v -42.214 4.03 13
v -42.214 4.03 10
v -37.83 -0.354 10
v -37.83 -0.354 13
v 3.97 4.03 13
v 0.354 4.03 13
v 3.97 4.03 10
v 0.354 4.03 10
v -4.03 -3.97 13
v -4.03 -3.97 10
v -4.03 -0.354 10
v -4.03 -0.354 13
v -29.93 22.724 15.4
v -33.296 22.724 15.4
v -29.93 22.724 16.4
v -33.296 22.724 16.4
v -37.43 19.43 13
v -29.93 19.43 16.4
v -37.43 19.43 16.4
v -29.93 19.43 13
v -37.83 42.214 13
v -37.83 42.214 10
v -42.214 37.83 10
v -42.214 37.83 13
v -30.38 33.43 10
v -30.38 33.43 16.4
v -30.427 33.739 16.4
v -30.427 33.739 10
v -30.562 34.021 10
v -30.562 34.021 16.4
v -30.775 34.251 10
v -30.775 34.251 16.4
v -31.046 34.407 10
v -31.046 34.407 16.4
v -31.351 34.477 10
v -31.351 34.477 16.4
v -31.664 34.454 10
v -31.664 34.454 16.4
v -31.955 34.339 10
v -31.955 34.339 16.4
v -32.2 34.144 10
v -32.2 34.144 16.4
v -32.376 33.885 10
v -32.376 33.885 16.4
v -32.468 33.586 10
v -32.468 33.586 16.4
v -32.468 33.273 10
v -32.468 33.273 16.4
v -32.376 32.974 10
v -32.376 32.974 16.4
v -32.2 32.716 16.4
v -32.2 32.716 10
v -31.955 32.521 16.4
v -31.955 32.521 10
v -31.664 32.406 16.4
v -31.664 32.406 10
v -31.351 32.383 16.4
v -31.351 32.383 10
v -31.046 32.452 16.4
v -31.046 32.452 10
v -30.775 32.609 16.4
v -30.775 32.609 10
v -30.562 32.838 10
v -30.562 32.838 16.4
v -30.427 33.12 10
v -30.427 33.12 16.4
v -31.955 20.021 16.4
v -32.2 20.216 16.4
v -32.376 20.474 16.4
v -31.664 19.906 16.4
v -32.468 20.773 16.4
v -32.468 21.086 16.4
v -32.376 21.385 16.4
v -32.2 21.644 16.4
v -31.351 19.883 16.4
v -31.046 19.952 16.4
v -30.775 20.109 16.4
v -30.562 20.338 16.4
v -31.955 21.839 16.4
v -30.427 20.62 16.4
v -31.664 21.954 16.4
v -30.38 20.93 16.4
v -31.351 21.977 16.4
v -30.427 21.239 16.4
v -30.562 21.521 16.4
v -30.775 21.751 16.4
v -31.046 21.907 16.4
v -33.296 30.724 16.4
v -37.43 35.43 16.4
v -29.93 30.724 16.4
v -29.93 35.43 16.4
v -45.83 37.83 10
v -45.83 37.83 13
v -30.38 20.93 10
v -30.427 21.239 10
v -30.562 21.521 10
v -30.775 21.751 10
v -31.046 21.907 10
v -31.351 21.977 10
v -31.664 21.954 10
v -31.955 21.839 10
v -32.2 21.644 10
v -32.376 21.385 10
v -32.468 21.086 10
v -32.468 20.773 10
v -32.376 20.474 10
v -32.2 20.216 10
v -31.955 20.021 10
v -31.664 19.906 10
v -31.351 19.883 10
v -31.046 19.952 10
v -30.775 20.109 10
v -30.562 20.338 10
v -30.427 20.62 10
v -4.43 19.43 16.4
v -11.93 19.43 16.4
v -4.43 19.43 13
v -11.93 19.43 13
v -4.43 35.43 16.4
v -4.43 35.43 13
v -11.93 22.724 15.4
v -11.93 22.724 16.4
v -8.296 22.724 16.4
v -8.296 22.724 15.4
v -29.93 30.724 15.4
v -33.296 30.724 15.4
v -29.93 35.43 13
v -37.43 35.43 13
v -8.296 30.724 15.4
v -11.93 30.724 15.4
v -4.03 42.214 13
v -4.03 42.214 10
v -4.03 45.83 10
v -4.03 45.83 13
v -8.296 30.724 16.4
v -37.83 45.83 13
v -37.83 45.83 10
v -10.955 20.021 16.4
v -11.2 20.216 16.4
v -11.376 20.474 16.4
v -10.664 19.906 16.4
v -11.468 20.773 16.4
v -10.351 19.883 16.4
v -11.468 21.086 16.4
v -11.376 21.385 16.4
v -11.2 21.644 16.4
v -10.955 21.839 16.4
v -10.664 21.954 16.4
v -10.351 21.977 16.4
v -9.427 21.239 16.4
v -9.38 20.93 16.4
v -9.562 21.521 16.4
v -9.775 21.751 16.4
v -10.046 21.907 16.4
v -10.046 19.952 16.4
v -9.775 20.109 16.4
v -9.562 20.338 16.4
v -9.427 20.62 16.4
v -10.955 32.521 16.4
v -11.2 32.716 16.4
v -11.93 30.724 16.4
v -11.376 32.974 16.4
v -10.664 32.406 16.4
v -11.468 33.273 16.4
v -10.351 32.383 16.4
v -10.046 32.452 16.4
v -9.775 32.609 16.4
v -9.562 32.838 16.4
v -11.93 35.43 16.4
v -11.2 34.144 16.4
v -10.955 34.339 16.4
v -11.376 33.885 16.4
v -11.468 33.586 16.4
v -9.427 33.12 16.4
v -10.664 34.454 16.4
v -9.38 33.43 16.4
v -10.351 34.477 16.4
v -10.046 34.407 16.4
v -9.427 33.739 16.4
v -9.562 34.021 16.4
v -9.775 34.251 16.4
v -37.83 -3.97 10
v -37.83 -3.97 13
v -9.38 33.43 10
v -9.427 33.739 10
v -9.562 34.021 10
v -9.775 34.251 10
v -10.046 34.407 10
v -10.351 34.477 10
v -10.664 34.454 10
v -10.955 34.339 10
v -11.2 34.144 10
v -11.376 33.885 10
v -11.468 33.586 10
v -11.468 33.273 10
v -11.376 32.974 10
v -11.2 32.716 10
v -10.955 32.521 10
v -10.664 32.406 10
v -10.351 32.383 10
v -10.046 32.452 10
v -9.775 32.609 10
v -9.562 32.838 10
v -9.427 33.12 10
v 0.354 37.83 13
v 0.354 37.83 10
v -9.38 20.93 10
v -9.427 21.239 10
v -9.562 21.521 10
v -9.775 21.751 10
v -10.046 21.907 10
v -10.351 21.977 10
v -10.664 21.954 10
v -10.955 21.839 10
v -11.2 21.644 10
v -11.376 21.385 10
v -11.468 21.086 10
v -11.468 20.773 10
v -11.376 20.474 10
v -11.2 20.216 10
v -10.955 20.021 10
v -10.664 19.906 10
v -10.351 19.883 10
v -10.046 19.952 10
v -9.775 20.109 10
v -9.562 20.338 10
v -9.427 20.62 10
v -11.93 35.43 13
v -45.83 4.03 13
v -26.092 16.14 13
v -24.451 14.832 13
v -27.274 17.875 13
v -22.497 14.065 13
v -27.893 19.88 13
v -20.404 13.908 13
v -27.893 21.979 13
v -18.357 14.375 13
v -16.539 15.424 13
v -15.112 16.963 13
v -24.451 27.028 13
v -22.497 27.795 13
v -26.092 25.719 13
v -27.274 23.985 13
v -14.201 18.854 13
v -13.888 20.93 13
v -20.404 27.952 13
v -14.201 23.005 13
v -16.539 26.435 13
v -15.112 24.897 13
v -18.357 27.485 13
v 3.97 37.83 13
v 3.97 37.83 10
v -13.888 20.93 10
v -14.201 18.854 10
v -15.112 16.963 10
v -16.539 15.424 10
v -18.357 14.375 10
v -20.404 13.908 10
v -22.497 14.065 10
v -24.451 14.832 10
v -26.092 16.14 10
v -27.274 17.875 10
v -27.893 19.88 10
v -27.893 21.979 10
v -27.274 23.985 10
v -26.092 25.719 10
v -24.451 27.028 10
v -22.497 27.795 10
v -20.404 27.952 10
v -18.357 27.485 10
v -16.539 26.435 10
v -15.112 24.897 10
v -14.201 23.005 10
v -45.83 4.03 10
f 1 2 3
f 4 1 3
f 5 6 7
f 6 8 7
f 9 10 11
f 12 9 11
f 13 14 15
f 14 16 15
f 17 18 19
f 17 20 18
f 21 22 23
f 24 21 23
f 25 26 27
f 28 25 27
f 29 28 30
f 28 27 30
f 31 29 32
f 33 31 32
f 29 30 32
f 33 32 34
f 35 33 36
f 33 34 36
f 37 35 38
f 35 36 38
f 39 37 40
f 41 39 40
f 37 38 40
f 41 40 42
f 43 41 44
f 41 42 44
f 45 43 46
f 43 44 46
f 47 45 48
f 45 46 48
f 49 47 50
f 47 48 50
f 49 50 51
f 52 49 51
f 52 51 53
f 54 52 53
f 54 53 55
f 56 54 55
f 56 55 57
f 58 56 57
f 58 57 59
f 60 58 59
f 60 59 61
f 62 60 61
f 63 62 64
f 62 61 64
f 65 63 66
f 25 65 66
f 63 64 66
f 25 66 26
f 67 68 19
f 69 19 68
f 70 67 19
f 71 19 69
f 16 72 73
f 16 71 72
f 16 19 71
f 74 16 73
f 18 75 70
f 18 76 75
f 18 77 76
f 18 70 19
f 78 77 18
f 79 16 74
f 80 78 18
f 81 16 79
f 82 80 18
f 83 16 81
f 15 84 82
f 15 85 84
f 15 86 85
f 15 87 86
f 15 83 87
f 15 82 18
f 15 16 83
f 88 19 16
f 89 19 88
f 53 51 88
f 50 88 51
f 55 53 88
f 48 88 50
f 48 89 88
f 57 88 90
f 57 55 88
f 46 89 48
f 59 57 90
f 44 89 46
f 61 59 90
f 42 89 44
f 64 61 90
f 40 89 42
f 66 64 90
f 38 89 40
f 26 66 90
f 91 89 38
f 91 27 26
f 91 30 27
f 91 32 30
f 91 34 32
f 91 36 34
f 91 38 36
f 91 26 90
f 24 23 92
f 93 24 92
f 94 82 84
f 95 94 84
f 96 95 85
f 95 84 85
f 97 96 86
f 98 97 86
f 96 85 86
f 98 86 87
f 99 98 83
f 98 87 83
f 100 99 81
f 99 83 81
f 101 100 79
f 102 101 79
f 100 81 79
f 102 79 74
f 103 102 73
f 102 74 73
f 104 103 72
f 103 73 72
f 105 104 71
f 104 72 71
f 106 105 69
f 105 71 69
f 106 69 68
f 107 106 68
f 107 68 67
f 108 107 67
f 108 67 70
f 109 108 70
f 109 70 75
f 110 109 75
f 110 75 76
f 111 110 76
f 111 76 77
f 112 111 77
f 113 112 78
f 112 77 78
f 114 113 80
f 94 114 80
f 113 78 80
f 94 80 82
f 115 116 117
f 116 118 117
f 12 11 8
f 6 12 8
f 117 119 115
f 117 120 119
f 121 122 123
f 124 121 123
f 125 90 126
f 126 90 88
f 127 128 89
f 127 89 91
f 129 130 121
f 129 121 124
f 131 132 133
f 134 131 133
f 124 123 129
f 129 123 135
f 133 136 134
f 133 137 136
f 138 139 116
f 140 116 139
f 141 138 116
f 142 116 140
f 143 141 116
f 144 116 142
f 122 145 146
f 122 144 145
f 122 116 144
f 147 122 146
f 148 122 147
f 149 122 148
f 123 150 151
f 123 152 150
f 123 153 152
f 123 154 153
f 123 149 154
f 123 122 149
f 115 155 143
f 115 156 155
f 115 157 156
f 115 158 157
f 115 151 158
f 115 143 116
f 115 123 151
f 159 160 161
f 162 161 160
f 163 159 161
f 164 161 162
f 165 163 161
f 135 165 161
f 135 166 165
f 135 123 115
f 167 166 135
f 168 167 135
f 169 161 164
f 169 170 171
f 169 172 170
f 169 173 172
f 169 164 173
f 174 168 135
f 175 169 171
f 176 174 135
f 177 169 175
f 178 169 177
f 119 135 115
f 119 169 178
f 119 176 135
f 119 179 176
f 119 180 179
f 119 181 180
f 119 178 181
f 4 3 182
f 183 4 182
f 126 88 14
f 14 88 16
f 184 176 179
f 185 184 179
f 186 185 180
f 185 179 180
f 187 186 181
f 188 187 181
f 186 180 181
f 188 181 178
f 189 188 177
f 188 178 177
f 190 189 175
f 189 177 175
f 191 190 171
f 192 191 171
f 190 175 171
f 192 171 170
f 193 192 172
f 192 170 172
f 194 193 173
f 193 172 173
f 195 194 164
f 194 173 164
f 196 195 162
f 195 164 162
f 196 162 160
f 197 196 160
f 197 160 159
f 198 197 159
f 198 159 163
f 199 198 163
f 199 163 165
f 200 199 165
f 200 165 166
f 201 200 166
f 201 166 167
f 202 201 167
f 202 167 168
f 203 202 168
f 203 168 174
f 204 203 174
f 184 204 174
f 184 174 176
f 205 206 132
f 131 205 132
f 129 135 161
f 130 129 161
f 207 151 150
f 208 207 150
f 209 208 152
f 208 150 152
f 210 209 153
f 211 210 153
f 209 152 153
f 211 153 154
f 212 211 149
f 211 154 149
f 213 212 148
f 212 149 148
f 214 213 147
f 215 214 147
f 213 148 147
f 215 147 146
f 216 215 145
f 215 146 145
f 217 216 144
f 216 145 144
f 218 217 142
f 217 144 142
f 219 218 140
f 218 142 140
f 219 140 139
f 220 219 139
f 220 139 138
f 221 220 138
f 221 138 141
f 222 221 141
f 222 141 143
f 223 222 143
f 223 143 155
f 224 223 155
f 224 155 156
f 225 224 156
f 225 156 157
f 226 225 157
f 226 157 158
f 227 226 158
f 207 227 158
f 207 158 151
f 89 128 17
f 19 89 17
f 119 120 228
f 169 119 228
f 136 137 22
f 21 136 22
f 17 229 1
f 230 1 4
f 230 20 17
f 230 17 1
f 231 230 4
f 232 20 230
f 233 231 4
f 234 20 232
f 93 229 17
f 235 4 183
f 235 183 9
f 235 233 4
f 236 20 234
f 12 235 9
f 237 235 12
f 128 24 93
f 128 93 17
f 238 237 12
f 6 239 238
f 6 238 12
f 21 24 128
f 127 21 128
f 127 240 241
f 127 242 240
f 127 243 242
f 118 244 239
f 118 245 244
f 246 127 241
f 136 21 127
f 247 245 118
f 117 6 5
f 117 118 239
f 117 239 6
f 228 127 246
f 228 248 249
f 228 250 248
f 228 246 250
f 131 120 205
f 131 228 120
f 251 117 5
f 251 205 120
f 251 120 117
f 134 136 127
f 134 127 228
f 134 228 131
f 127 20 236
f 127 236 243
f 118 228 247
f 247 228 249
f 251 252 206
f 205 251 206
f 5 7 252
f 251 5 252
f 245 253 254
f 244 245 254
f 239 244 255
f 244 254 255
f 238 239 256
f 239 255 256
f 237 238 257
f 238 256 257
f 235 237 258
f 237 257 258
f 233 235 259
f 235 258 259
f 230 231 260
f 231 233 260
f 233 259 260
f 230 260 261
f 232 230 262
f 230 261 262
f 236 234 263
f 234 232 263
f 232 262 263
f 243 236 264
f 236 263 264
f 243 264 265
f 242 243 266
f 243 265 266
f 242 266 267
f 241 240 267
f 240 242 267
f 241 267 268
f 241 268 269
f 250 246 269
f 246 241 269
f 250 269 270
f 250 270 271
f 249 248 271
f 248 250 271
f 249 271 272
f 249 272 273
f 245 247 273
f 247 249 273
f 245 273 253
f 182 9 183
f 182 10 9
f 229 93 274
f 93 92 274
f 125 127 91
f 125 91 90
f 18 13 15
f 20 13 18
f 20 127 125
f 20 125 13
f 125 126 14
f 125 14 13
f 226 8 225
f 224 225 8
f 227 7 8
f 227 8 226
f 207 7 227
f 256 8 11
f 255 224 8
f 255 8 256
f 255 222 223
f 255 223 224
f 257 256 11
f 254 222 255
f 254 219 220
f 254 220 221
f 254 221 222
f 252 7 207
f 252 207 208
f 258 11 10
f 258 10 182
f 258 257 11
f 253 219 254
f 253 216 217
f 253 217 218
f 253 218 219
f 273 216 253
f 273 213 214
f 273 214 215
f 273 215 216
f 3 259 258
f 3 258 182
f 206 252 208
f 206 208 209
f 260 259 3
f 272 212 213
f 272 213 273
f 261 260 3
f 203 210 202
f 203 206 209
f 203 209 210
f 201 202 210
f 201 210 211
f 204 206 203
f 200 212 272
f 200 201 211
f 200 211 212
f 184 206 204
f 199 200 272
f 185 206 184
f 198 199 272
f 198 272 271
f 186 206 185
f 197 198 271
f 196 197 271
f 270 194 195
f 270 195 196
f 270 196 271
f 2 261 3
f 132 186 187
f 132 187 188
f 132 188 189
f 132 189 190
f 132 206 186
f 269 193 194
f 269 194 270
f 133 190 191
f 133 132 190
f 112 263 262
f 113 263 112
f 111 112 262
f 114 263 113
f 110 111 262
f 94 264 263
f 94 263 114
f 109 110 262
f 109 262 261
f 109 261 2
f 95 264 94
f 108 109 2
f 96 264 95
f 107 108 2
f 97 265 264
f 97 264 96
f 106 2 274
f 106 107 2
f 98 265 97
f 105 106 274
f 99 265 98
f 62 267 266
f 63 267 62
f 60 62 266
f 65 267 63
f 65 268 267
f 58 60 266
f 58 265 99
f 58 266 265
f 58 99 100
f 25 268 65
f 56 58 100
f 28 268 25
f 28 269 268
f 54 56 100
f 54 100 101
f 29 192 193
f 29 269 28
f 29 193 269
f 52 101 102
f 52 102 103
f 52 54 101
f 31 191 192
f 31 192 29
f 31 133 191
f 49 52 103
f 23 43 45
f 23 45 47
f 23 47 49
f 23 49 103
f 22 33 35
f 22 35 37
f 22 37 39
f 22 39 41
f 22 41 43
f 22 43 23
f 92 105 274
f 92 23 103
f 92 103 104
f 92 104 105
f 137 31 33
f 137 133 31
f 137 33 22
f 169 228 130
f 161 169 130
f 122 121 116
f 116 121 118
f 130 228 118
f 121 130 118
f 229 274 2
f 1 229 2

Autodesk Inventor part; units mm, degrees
ref_plane "YZ Plane" through (0, 0, 0) normal (1, 0, 0) x (0, 1, 0)
ref_plane "Work Plane1" through (0, 0, 10) normal (0, 0, 1) x (1, 0, 0)
sketch "Sketch1" plane through (0, 0, 10) normal (0, 0, 1) x (1, 0, 0)
  line L0 (-4.0299, -0.3538) -> (-2.2322, 1.4439) construction
  arc A0 (-1.4439, 2.2322) -> (-2.2322, 1.4439) centre (-0.9299, 0.9299) ccw construction
  line L1 (-1.4439, 2.2322) -> (0.3538, 4.0299) construction
  line L2 (-37.8299, 42.2137) -> (-37.8299, 45.8299) construction
  line L3 (-37.8299, 45.8299) -> (-4.0299, 45.8299) construction
  line L4 (-4.0299, 45.8299) -> (-4.0299, 42.2137) construction
  line L5 (-4.0299, 4.0299) -> (0.3538, 4.0299) projected
  circle A1 centre (-20.9299, 20.9299) radius 17.5 projected
  line L6 (-20.9299, 58.9723) -> (17.1124, 20.9299) construction
  line L7 (17.1124, 20.9299) -> (-20.9299, -17.1124) construction
  line L8 (-20.9299, -17.1124) -> (-58.9723, 20.9299) construction
  line L9 (-58.9723, 20.9299) -> (-20.9299, 58.9723) construction
  line L10 (-20.9299, 58.9723) -> (-20.9299, -17.1124) construction
  line L11 (17.1124, 20.9299) -> (-58.9723, 20.9299) construction
  line L12 (-20.9299, 58.9723) -> (32.8701, 58.9723) construction
  line L13 (-43.4299, 43.4299) -> (1.5701, 43.4299) construction
  line L14 (1.5701, 43.4299) -> (1.5701, -1.5701) construction
  line L15 (1.5701, -1.5701) -> (-43.4299, -1.5701) construction
  line L16 (-43.4299, -1.5701) -> (-43.4299, 43.4299) construction
  line L17 (-43.4299, 43.4299) -> (1.5701, -1.5701) construction
  line L18 (1.5701, 43.4299) -> (-43.4299, -1.5701) construction
  line L19 (-43.4299, 5.3876) -> (-43.4299, 36.4723)
  line L20 (-43.4299, 36.4723) -> (-36.4723, 43.4299)
  line L21 (-36.4723, 43.4299) -> (-5.3876, 43.4299)
  line L22 (-5.3876, 43.4299) -> (1.5701, 36.4723)
  line L23 (1.5701, 36.4723) -> (1.5701, 5.3876)
  line L24 (1.5701, 5.3876) -> (-5.3876, -1.5701)
  line L25 (-5.3876, -1.5701) -> (-36.4723, -1.5701)
  line L26 (-36.4723, -1.5701) -> (-43.4299, 5.3876)
  line L27 (-4.0299, 42.2137) -> (-37.8299, 42.2137) projected
  line L28 (-4.0299, -0.3538) -> (-4.0299, 4.0299) projected
  circle A2 centre (-20.9299, 20.9299) radius 7.0417
  point P0 (-37.8299, 4.0299)
  dimension "d18" = 53.8
  dimension "d19" = 45
  dimension "d20" = 53.8
  dimension "d21" = 45
  dimension "d22" = 45
extrude "Extrusion1" add sketch "Sketch1" along normal blind 3 contours L28 L24 L25 L26 L19 L20 L27 L22 L23 L5 | L5 L24 L28 | L27 L20 L21 L22 | A1
sketch "Sketch3" plane through (0, 0, 10) normal (0, 0, -1) x (-1, 0, 0)
  line L0 (37.8299, -0.4701) -> (37.8299, 4.0299) construction
  line L1 (4.0299, 4.0299) -> (4.0299, -0.4701) construction
  line L2 (37.8299, -0.4701) -> (37.8299, 1.1886) construction
  line L3 (4.0299, -3.9701) -> (4.0299, -0.3538) construction
  line L4 (45.8299, 4.0299) -> (42.2137, 4.0299) construction
  line L5 (-0.3538, 4.0299) -> (-3.9701, 4.0299) construction
  line L6 (-3.9701, 37.8299) -> (-0.3538, 37.8299) construction
  line L7 (4.0299, 42.2137) -> (4.0299, 45.8299) construction
  line L8 (37.8299, 45.8299) -> (37.8299, 42.2137) construction
  line L9 (42.2137, 37.8299) -> (45.8299, 37.8299) construction
  line L10 (37.8299, 37.7299) -> (45.8299, 37.7299)
  line L11 (45.8299, 37.7299) -> (45.8299, 4.1299)
  line L12 (45.8299, 4.1299) -> (37.8299, 4.1299)
  line L13 (37.8299, 4.1299) -> (37.8299, 37.7299)
  line L14 (37.7299, 4.0299) -> (4.1299, 4.0299)
  line L15 (4.1299, 4.0299) -> (4.1299, -3.9701)
  line L16 (4.1299, -3.9701) -> (37.7299, -3.9701)
  line L17 (37.7299, -3.9701) -> (37.7299, 4.0299)
  line L18 (4.0299, 4.1299) -> (-3.9701, 4.1299)
  line L19 (-3.9701, 4.1299) -> (-3.9701, 37.7299)
  line L20 (-3.9701, 37.7299) -> (4.0299, 37.7299)
  line L21 (4.0299, 37.7299) -> (4.0299, 4.1299)
  line L22 (4.1299, 37.8299) -> (37.7299, 37.8299)
  line L23 (37.7299, 37.8299) -> (37.7299, 45.8299)
  line L24 (37.7299, 45.8299) -> (4.1299, 45.8299)
  line L25 (4.1299, 45.8299) -> (4.1299, 37.8299)
  point P0 (0, 0)
  dimension "d23" = 0.1
  dimension "d24" = 0.1
  dimension "d25" = 0.1
  dimension "d26" = 0.1
  dimension "d27" = 0.1
extrude "Extrusion3" add sketch "Sketch3" against normal up to surface (3 mm away)
sketch "Sketch4" plane through (0, 0, 13) normal (0, 0, 1) x (1, 0, 0)
  line L0 (-33.4299, 35.4299) -> (-33.4299, 11.4299) construction
  line L1 (-33.4299, 11.4299) -> (-8.4299, 11.4299) construction
  line L2 (-8.4299, 11.4299) -> (-8.4299, 35.4299) construction
  line L3 (-8.4299, 35.4299) -> (-33.4299, 35.4299) construction
  circle A0 centre (-10.4299, 33.4299) radius 1.05 construction
  circle A1 centre (-10.4299, 20.9299) radius 1.05 construction
  circle A2 centre (-31.4299, 20.9299) radius 1.05 construction
  circle A3 centre (-31.4299, 33.4299) radius 1.05 construction
  line L4 (-15.4299, 29.8299) -> (-12.4299, 29.8299) construction
  line L5 (-15.4299, 31.8299) -> (-15.4299, 29.8299) construction
  line L6 (-12.4299, 31.8299) -> (-15.4299, 31.8299) construction
  line L7 (-12.4299, 29.8299) -> (-12.4299, 31.8299) construction
  line L8 (-8.4299, 35.4299) -> (-11.9299, 35.4299)
  line L9 (-11.9299, 35.4299) -> (-11.9299, 19.4299)
  line L10 (-11.9299, 19.4299) -> (-8.4299, 19.4299)
  line L11 (-8.4299, 19.4299) -> (-8.4299, 35.4299)
  line L12 (-33.4299, 35.4299) -> (-29.9299, 35.4299)
  line L13 (-29.9299, 35.4299) -> (-29.9299, 19.4299)
  line L14 (-29.9299, 19.4299) -> (-33.4299, 19.4299)
  line L15 (-33.4299, 19.4299) -> (-33.4299, 35.4299)
  line L16 (-33.4299, 35.4299) -> (-37.4299, 35.4299)
  line L17 (-37.4299, 35.4299) -> (-37.4299, 19.4299)
  line L18 (-37.4299, 19.4299) -> (-33.4299, 19.4299)
  line L19 (-33.4299, 19.4299) -> (-33.4299, 35.4299)
  line L20 (-8.4299, 35.4299) -> (-4.4299, 35.4299)
  line L21 (-4.4299, 35.4299) -> (-4.4299, 19.4299)
  line L22 (-4.4299, 19.4299) -> (-8.4299, 19.4299)
  line L23 (-8.4299, 19.4299) -> (-8.4299, 35.4299)
  point P0 (0, 0)
  dimension "d30" = 3.5
  dimension "d31" = 16
  dimension "d32" = 3.5
  dimension "d37" = 4
  dimension "d38" = 4
ref_plane "Work Plane3" through (-33.4299, 11.4299, 16.4) normal (0, 0, -1) x (0, 1, 0)
extrude "Extrusion4" add sketch "Sketch4" along normal up to surface (3.4 mm away)
sketch "Sketch5" plane through (-11.9299, 35.4299, 16.4) normal (0, 0, 1) x (1, 0, 0)
  circle A0 centre (1.5, -14.5) radius 1.05 projected
  circle A1 centre (1.5, -2) radius 1.05 projected
  circle A2 centre (-19.5, -2) radius 1.05 projected
  circle A3 centre (-19.5, -14.5) radius 1.05 projected
  point P0 (11.9299, -35.4299)
extrude "Extrusion5" cut sketch "Sketch5" against normal through all
sketch "Sketch7" plane through (-37.4299, 35.4299, 13) normal (0, 1, 0) x (1, 0, 0)
  line L0 (4.95, -3.4) -> (4.95, 3) projected
  line L1 (7.5, -3.4) -> (0, -3.4) projected
  line L2 (7.5, 0) -> (7.5, -3.4) projected
  line L3 (0, 0) -> (7.5, 0) projected
  line L4 (0, 0) -> (0, -3.4) projected
  line L5 (33, -3.4) -> (25.5, -3.4) projected
  line L6 (33, 0) -> (33, -3.4) projected
  line L7 (25.5, 0) -> (33, 0) projected
  line L8 (25.5, 0) -> (25.5, -3.4) projected
  line L9 (0, -3.4) -> (7.5, -3.4) projected
  line L10 (0, -3.4) -> (3, -3.4)
  line L11 (3, -3.4) -> (3, -13.4)
  line L12 (3, -13.4) -> (0, -13.4)
  line L13 (0, -13.4) -> (0, -3.4)
  line L14 (33, -3.4) -> (30, -3.4)
  line L15 (30, -3.4) -> (30, -13.4)
  line L16 (30, -13.4) -> (33, -13.4)
  line L17 (33, -13.4) -> (33, -3.4)
  line L18 (0, -13.4) -> (7, -13.4)
  line L19 (7, -13.4) -> (7, -15.4)
  line L20 (7, -15.4) -> (0, -15.4)
  line L21 (0, -15.4) -> (0, -13.4)
  line L22 (33, -13.4) -> (26, -13.4)
  line L23 (26, -13.4) -> (26, -15.4)
  line L24 (26, -15.4) -> (33, -15.4)
  line L25 (33, -15.4) -> (33, -13.4)
  line L26 (3, -12) -> (5, -12)
  line L27 (5, -12) -> (5, -10)
  line L28 (5, -10) -> (3, -10)
  line L29 (3, -10) -> (3, -12)
  line L30 (30, -12) -> (28, -12)
  line L31 (28, -12) -> (28, -10)
  line L32 (28, -10) -> (30, -10)
  line L33 (30, -10) -> (30, -12)
  line L34 (5, -10) -> (3, -8)
  line L35 (5, -10) -> (7.8284, -10) construction
  line L36 (28, -10) -> (30, -8)
  line L37 (0, -15.4) -> (-2.7154, 0)
  line L38 (-4.7423, 0) -> (-0.3, 0) projected
  line L39 (0, -15.4) -> (15.6376, -15.4) construction
  line L40 (-2.7154, 0) -> (0, 0)
  line L41 (0, -15.4) -> (0, 0)
  line L42 (33, -15.4) -> (35.7154, 0)
  line L43 (33, -15.4) -> (48.6376, -15.4) construction
  line L44 (35.7154, 0) -> (33, 0)
  line L45 (37.7423, 0) -> (33.3, 0) projected
  line L46 (33, -15.4) -> (33, 0)
  point P0 (37.4299, 13)
  dimension "d39" = 3
  dimension "d40" = 10
  dimension "d41" = 3
  dimension "d42" = 7
  dimension "d43" = 2
  dimension "d44" = 7
  dimension "d47" = 27
  dimension "d48" = 1.4
  dimension "d49" = 2
  dimension "d50" = 2
  dimension "d51" = 2
  dimension "d52" = 135
  dimension "d53" = 100
  dimension "d54" = 80
extrude "Extrusion6" [suppressed]
sketch "Sketch8" plane through (-29.9299, 35.4299, 16.4) normal (0, 1, 0) x (1, 0, 0)
  line L0 (0, 0) -> (-7.5, 0) projected
  line L1 (0, 3.4) -> (0, 0) projected
  line L2 (-7.5, 3.4) -> (0, 3.4) projected
  line L3 (18, 3.4) -> (25.5, 3.4) projected
  line L4 (18, 3.4) -> (18, 0) projected
  line L5 (25.5, 0) -> (18, 0) projected
  line L6 (25.5, 3.4) -> (25.5, 0) projected
  line L7 (-7.5, 3.4) -> (-7.5, 0) projected
  point P0 (29.9299, 16.4)
extrude "Extrusion7" [suppressed]
sketch "Sketch9" plane through (-37.7299, 45.8299, 13) normal (0, 0, -1) x (-1, 0, 0)
  line L0 (0, -3.6577) -> (2.4154, -6.0731) projected
  line L1 (2.4154, -6.0731) -> (2.4154, 0) projected
  line L2 (2.4154, 0) -> (0, 0) projected
  line L3 (0, -3.6577) -> (0, 0) projected
  line L4 (-33.6, 0) -> (-33.6, -3.6577) projected
  line L5 (-33.6, 0) -> (-36.0154, 0) projected
  line L6 (-36.0154, -6.0731) -> (-36.0154, 0) projected
  line L7 (-36.0154, -6.0731) -> (-33.6, -3.6577) projected
  point P0 (-37.7299, -45.8299)
extrude "Extrusion8" [suppressed]
sketch "Sketch10" plane through (-29.9299, 19.4299, 16.4) normal (0, 0, 1) x (1, 0, 0)
  line L0 (0, 16) -> (0, 0) projected
  line L1 (18, 0) -> (18, 16) projected
  line L2 (-3.3664, 3.2942) -> (21.6336, 3.2942)
  line L3 (21.6336, 3.2942) -> (21.6336, 11.2942)
  line L4 (21.6336, 11.2942) -> (-3.3664, 11.2942)
  line L5 (-3.3664, 11.2942) -> (-3.3664, 3.2942)
  line L6 (-3.3664, 3.2942) -> (21.6336, 11.2942) construction
  line L7 (21.6336, 3.2942) -> (-3.3664, 11.2942) construction
  point P0 (29.9299, -19.4299)
  point P1 (0, 26.4)
  point P2 (18, 26.4)
  point P3 (9.1336, 7.2942)
  dimension "d59" = 25
  dimension "d60" = 8
extrude "Extrusion9" cut sketch "Sketch10" against normal blind 1
sketch "Sketch11" plane through (-37.4299, 19.4299, 28.4) normal (0, 0, 1) x (1, 0, 0)
  line L0 (0, 0) -> (7, 0) projected
  line L1 (7, 0) -> (7, 26.4) projected
  line L2 (7, 26.4) -> (0, 26.4) projected
  line L3 (0, 26.4) -> (0, 0) projected
  line L4 (26, 0) -> (33, 0) projected
  line L5 (33, 0) -> (33, 26.4) projected
  line L6 (33, 26.4) -> (26, 26.4) projected
  line L7 (26, 0) -> (26, 26.4) projected
  circle A0 centre (16.5, 1.5) radius 7.0417 projected
  circle A1 centre (6, 1.5) radius 1.05 construction
  circle A2 centre (6, 14) radius 1.05 construction
  line L8 (27, 1.5) -> (6, 1.5) construction
  line L9 (27, 4.6642) -> (6, 4.6642)
  line L10 (6, -1.6642) -> (27, -1.6642)
  arc A3 (27, -1.6642) -> (27, 4.6642) centre (27, 1.5) ccw
  arc A4 (6, 4.6642) -> (6, -1.6642) centre (6, 1.5) ccw
  line L11 (27, 14) -> (6, 14) construction
  line L12 (27, 17.1642) -> (6, 17.1642)
  line L13 (6, 10.8358) -> (27, 10.8358)
  arc A5 (27, 10.8358) -> (27, 17.1642) centre (27, 14) ccw
  arc A6 (6, 17.1642) -> (6, 10.8358) centre (6, 14) ccw
  point P0 (37.4299, -19.4299)
  point P1 (16.5, 14)
extrude "Extrusion10" [suppressed]
sketch "Skizze12" plane through (0, 0, 10) normal (0, 0, -1) x (-1, 0, 0)
  circle A0 centre (31.4299, 33.4299) radius 1.05 construction
  circle A1 centre (10.4299, 20.9299) radius 1.05 construction
  circle A2 centre (10.4299, 33.4299) radius 1.05 construction
  circle A3 centre (31.4299, 20.9299) radius 1.05 construction
  line L0 (-0.3124, 4.1299) -> (4.1299, -0.3124) projected
  line L1 (4.1299, -0.3124) -> (4.1299, -3.9701) projected
  line L2 (4.1299, -3.9701) -> (37.7299, -3.9701) construction
  line L3 (37.7299, -3.9701) -> (37.7299, -0.3124) projected
  line L4 (37.7299, -0.3124) -> (42.1723, 4.1299) projected
  line L5 (45.8299, 4.1299) -> (42.1723, 4.1299) projected
  line L6 (45.8299, 37.7299) -> (45.8299, 4.1299) construction
  line L7 (42.1723, 37.7299) -> (45.8299, 37.7299) projected
  line L8 (42.1723, 37.7299) -> (37.7299, 42.1723) projected
  line L9 (37.7299, 42.1723) -> (37.7299, 45.8299) projected
  line L10 (37.7299, 45.8299) -> (4.1299, 45.8299) construction
  line L11 (4.1299, 45.8299) -> (4.1299, 42.1723) projected
  line L12 (4.1299, 42.1723) -> (-0.3124, 37.7299) projected
  line L13 (-3.9701, 37.7299) -> (-0.3124, 37.7299) projected
  line L14 (-3.9701, 4.1299) -> (-3.9701, 37.7299) construction
  line L15 (-0.3124, 4.1299) -> (-3.9701, 4.1299) projected
  circle A4 centre (20.9299, 20.9299) radius 7.0417 construction
  line L16 (37.8299, -4.0701) -> (4.0299, -4.0701) construction
  line L17 (4.0299, -4.0701) -> (4.0299, -0.3538)
  line L18 (4.0299, -0.3538) -> (-0.3538, 4.0299)
  line L19 (-0.3538, 4.0299) -> (-4.0701, 4.0299)
  line L20 (-4.0701, 4.0299) -> (-4.0701, 37.8299) construction
  line L21 (-4.0701, 37.8299) -> (-0.3538, 37.8299)
  line L22 (-0.3538, 37.8299) -> (4.0299, 42.2137)
  line L23 (4.0299, 42.2137) -> (4.0299, 45.9299)
  line L24 (4.0299, 45.9299) -> (37.8299, 45.9299) construction
  line L25 (37.8299, 45.9299) -> (37.8299, 42.2137)
  line L26 (37.8299, 42.2137) -> (42.2137, 37.8299)
  line L27 (42.2137, 37.8299) -> (45.9299, 37.8299)
  line L28 (45.9299, 37.8299) -> (45.9299, 4.0299) construction
  line L29 (45.9299, 4.0299) -> (42.2137, 4.0299)
  line L30 (42.2137, 4.0299) -> (37.8299, -0.3538)
  line L31 (37.8299, -0.3538) -> (37.8299, -4.0701)
  line L32 (-3.9701, 37.7299) -> (-3.9701, 37.8299)
  line L33 (37.7299, 45.8299) -> (4.1299, 45.8299) projected
  line L34 (4.1299, 45.8299) -> (4.0299, 45.8299)
  line L35 (37.7299, 45.8299) -> (37.8299, 45.8299)
  line L36 (45.8299, 37.7299) -> (45.8299, 37.8299)
  line L37 (45.8299, 4.1299) -> (45.8299, 4.0299)
  line L38 (37.7299, -3.9701) -> (37.8299, -3.9701)
  line L39 (4.1299, -3.9701) -> (4.0299, -3.9701)
  line L40 (-3.9701, 4.1299) -> (-3.9701, 4.0299)
  point P0 (0, 0)
  dimension "d18" = 53.8
  dimension "d19" = 45
  dimension "d20" = 53.8
  dimension "d21" = 45
  dimension "d22" = 45
  dimension "d65" = 0.1
extrude "IM_offset" add sketch "Skizze12" against normal up to surface (3 mm away)
properties part number "20_Cube_Insert_RaspiCam_v3"
